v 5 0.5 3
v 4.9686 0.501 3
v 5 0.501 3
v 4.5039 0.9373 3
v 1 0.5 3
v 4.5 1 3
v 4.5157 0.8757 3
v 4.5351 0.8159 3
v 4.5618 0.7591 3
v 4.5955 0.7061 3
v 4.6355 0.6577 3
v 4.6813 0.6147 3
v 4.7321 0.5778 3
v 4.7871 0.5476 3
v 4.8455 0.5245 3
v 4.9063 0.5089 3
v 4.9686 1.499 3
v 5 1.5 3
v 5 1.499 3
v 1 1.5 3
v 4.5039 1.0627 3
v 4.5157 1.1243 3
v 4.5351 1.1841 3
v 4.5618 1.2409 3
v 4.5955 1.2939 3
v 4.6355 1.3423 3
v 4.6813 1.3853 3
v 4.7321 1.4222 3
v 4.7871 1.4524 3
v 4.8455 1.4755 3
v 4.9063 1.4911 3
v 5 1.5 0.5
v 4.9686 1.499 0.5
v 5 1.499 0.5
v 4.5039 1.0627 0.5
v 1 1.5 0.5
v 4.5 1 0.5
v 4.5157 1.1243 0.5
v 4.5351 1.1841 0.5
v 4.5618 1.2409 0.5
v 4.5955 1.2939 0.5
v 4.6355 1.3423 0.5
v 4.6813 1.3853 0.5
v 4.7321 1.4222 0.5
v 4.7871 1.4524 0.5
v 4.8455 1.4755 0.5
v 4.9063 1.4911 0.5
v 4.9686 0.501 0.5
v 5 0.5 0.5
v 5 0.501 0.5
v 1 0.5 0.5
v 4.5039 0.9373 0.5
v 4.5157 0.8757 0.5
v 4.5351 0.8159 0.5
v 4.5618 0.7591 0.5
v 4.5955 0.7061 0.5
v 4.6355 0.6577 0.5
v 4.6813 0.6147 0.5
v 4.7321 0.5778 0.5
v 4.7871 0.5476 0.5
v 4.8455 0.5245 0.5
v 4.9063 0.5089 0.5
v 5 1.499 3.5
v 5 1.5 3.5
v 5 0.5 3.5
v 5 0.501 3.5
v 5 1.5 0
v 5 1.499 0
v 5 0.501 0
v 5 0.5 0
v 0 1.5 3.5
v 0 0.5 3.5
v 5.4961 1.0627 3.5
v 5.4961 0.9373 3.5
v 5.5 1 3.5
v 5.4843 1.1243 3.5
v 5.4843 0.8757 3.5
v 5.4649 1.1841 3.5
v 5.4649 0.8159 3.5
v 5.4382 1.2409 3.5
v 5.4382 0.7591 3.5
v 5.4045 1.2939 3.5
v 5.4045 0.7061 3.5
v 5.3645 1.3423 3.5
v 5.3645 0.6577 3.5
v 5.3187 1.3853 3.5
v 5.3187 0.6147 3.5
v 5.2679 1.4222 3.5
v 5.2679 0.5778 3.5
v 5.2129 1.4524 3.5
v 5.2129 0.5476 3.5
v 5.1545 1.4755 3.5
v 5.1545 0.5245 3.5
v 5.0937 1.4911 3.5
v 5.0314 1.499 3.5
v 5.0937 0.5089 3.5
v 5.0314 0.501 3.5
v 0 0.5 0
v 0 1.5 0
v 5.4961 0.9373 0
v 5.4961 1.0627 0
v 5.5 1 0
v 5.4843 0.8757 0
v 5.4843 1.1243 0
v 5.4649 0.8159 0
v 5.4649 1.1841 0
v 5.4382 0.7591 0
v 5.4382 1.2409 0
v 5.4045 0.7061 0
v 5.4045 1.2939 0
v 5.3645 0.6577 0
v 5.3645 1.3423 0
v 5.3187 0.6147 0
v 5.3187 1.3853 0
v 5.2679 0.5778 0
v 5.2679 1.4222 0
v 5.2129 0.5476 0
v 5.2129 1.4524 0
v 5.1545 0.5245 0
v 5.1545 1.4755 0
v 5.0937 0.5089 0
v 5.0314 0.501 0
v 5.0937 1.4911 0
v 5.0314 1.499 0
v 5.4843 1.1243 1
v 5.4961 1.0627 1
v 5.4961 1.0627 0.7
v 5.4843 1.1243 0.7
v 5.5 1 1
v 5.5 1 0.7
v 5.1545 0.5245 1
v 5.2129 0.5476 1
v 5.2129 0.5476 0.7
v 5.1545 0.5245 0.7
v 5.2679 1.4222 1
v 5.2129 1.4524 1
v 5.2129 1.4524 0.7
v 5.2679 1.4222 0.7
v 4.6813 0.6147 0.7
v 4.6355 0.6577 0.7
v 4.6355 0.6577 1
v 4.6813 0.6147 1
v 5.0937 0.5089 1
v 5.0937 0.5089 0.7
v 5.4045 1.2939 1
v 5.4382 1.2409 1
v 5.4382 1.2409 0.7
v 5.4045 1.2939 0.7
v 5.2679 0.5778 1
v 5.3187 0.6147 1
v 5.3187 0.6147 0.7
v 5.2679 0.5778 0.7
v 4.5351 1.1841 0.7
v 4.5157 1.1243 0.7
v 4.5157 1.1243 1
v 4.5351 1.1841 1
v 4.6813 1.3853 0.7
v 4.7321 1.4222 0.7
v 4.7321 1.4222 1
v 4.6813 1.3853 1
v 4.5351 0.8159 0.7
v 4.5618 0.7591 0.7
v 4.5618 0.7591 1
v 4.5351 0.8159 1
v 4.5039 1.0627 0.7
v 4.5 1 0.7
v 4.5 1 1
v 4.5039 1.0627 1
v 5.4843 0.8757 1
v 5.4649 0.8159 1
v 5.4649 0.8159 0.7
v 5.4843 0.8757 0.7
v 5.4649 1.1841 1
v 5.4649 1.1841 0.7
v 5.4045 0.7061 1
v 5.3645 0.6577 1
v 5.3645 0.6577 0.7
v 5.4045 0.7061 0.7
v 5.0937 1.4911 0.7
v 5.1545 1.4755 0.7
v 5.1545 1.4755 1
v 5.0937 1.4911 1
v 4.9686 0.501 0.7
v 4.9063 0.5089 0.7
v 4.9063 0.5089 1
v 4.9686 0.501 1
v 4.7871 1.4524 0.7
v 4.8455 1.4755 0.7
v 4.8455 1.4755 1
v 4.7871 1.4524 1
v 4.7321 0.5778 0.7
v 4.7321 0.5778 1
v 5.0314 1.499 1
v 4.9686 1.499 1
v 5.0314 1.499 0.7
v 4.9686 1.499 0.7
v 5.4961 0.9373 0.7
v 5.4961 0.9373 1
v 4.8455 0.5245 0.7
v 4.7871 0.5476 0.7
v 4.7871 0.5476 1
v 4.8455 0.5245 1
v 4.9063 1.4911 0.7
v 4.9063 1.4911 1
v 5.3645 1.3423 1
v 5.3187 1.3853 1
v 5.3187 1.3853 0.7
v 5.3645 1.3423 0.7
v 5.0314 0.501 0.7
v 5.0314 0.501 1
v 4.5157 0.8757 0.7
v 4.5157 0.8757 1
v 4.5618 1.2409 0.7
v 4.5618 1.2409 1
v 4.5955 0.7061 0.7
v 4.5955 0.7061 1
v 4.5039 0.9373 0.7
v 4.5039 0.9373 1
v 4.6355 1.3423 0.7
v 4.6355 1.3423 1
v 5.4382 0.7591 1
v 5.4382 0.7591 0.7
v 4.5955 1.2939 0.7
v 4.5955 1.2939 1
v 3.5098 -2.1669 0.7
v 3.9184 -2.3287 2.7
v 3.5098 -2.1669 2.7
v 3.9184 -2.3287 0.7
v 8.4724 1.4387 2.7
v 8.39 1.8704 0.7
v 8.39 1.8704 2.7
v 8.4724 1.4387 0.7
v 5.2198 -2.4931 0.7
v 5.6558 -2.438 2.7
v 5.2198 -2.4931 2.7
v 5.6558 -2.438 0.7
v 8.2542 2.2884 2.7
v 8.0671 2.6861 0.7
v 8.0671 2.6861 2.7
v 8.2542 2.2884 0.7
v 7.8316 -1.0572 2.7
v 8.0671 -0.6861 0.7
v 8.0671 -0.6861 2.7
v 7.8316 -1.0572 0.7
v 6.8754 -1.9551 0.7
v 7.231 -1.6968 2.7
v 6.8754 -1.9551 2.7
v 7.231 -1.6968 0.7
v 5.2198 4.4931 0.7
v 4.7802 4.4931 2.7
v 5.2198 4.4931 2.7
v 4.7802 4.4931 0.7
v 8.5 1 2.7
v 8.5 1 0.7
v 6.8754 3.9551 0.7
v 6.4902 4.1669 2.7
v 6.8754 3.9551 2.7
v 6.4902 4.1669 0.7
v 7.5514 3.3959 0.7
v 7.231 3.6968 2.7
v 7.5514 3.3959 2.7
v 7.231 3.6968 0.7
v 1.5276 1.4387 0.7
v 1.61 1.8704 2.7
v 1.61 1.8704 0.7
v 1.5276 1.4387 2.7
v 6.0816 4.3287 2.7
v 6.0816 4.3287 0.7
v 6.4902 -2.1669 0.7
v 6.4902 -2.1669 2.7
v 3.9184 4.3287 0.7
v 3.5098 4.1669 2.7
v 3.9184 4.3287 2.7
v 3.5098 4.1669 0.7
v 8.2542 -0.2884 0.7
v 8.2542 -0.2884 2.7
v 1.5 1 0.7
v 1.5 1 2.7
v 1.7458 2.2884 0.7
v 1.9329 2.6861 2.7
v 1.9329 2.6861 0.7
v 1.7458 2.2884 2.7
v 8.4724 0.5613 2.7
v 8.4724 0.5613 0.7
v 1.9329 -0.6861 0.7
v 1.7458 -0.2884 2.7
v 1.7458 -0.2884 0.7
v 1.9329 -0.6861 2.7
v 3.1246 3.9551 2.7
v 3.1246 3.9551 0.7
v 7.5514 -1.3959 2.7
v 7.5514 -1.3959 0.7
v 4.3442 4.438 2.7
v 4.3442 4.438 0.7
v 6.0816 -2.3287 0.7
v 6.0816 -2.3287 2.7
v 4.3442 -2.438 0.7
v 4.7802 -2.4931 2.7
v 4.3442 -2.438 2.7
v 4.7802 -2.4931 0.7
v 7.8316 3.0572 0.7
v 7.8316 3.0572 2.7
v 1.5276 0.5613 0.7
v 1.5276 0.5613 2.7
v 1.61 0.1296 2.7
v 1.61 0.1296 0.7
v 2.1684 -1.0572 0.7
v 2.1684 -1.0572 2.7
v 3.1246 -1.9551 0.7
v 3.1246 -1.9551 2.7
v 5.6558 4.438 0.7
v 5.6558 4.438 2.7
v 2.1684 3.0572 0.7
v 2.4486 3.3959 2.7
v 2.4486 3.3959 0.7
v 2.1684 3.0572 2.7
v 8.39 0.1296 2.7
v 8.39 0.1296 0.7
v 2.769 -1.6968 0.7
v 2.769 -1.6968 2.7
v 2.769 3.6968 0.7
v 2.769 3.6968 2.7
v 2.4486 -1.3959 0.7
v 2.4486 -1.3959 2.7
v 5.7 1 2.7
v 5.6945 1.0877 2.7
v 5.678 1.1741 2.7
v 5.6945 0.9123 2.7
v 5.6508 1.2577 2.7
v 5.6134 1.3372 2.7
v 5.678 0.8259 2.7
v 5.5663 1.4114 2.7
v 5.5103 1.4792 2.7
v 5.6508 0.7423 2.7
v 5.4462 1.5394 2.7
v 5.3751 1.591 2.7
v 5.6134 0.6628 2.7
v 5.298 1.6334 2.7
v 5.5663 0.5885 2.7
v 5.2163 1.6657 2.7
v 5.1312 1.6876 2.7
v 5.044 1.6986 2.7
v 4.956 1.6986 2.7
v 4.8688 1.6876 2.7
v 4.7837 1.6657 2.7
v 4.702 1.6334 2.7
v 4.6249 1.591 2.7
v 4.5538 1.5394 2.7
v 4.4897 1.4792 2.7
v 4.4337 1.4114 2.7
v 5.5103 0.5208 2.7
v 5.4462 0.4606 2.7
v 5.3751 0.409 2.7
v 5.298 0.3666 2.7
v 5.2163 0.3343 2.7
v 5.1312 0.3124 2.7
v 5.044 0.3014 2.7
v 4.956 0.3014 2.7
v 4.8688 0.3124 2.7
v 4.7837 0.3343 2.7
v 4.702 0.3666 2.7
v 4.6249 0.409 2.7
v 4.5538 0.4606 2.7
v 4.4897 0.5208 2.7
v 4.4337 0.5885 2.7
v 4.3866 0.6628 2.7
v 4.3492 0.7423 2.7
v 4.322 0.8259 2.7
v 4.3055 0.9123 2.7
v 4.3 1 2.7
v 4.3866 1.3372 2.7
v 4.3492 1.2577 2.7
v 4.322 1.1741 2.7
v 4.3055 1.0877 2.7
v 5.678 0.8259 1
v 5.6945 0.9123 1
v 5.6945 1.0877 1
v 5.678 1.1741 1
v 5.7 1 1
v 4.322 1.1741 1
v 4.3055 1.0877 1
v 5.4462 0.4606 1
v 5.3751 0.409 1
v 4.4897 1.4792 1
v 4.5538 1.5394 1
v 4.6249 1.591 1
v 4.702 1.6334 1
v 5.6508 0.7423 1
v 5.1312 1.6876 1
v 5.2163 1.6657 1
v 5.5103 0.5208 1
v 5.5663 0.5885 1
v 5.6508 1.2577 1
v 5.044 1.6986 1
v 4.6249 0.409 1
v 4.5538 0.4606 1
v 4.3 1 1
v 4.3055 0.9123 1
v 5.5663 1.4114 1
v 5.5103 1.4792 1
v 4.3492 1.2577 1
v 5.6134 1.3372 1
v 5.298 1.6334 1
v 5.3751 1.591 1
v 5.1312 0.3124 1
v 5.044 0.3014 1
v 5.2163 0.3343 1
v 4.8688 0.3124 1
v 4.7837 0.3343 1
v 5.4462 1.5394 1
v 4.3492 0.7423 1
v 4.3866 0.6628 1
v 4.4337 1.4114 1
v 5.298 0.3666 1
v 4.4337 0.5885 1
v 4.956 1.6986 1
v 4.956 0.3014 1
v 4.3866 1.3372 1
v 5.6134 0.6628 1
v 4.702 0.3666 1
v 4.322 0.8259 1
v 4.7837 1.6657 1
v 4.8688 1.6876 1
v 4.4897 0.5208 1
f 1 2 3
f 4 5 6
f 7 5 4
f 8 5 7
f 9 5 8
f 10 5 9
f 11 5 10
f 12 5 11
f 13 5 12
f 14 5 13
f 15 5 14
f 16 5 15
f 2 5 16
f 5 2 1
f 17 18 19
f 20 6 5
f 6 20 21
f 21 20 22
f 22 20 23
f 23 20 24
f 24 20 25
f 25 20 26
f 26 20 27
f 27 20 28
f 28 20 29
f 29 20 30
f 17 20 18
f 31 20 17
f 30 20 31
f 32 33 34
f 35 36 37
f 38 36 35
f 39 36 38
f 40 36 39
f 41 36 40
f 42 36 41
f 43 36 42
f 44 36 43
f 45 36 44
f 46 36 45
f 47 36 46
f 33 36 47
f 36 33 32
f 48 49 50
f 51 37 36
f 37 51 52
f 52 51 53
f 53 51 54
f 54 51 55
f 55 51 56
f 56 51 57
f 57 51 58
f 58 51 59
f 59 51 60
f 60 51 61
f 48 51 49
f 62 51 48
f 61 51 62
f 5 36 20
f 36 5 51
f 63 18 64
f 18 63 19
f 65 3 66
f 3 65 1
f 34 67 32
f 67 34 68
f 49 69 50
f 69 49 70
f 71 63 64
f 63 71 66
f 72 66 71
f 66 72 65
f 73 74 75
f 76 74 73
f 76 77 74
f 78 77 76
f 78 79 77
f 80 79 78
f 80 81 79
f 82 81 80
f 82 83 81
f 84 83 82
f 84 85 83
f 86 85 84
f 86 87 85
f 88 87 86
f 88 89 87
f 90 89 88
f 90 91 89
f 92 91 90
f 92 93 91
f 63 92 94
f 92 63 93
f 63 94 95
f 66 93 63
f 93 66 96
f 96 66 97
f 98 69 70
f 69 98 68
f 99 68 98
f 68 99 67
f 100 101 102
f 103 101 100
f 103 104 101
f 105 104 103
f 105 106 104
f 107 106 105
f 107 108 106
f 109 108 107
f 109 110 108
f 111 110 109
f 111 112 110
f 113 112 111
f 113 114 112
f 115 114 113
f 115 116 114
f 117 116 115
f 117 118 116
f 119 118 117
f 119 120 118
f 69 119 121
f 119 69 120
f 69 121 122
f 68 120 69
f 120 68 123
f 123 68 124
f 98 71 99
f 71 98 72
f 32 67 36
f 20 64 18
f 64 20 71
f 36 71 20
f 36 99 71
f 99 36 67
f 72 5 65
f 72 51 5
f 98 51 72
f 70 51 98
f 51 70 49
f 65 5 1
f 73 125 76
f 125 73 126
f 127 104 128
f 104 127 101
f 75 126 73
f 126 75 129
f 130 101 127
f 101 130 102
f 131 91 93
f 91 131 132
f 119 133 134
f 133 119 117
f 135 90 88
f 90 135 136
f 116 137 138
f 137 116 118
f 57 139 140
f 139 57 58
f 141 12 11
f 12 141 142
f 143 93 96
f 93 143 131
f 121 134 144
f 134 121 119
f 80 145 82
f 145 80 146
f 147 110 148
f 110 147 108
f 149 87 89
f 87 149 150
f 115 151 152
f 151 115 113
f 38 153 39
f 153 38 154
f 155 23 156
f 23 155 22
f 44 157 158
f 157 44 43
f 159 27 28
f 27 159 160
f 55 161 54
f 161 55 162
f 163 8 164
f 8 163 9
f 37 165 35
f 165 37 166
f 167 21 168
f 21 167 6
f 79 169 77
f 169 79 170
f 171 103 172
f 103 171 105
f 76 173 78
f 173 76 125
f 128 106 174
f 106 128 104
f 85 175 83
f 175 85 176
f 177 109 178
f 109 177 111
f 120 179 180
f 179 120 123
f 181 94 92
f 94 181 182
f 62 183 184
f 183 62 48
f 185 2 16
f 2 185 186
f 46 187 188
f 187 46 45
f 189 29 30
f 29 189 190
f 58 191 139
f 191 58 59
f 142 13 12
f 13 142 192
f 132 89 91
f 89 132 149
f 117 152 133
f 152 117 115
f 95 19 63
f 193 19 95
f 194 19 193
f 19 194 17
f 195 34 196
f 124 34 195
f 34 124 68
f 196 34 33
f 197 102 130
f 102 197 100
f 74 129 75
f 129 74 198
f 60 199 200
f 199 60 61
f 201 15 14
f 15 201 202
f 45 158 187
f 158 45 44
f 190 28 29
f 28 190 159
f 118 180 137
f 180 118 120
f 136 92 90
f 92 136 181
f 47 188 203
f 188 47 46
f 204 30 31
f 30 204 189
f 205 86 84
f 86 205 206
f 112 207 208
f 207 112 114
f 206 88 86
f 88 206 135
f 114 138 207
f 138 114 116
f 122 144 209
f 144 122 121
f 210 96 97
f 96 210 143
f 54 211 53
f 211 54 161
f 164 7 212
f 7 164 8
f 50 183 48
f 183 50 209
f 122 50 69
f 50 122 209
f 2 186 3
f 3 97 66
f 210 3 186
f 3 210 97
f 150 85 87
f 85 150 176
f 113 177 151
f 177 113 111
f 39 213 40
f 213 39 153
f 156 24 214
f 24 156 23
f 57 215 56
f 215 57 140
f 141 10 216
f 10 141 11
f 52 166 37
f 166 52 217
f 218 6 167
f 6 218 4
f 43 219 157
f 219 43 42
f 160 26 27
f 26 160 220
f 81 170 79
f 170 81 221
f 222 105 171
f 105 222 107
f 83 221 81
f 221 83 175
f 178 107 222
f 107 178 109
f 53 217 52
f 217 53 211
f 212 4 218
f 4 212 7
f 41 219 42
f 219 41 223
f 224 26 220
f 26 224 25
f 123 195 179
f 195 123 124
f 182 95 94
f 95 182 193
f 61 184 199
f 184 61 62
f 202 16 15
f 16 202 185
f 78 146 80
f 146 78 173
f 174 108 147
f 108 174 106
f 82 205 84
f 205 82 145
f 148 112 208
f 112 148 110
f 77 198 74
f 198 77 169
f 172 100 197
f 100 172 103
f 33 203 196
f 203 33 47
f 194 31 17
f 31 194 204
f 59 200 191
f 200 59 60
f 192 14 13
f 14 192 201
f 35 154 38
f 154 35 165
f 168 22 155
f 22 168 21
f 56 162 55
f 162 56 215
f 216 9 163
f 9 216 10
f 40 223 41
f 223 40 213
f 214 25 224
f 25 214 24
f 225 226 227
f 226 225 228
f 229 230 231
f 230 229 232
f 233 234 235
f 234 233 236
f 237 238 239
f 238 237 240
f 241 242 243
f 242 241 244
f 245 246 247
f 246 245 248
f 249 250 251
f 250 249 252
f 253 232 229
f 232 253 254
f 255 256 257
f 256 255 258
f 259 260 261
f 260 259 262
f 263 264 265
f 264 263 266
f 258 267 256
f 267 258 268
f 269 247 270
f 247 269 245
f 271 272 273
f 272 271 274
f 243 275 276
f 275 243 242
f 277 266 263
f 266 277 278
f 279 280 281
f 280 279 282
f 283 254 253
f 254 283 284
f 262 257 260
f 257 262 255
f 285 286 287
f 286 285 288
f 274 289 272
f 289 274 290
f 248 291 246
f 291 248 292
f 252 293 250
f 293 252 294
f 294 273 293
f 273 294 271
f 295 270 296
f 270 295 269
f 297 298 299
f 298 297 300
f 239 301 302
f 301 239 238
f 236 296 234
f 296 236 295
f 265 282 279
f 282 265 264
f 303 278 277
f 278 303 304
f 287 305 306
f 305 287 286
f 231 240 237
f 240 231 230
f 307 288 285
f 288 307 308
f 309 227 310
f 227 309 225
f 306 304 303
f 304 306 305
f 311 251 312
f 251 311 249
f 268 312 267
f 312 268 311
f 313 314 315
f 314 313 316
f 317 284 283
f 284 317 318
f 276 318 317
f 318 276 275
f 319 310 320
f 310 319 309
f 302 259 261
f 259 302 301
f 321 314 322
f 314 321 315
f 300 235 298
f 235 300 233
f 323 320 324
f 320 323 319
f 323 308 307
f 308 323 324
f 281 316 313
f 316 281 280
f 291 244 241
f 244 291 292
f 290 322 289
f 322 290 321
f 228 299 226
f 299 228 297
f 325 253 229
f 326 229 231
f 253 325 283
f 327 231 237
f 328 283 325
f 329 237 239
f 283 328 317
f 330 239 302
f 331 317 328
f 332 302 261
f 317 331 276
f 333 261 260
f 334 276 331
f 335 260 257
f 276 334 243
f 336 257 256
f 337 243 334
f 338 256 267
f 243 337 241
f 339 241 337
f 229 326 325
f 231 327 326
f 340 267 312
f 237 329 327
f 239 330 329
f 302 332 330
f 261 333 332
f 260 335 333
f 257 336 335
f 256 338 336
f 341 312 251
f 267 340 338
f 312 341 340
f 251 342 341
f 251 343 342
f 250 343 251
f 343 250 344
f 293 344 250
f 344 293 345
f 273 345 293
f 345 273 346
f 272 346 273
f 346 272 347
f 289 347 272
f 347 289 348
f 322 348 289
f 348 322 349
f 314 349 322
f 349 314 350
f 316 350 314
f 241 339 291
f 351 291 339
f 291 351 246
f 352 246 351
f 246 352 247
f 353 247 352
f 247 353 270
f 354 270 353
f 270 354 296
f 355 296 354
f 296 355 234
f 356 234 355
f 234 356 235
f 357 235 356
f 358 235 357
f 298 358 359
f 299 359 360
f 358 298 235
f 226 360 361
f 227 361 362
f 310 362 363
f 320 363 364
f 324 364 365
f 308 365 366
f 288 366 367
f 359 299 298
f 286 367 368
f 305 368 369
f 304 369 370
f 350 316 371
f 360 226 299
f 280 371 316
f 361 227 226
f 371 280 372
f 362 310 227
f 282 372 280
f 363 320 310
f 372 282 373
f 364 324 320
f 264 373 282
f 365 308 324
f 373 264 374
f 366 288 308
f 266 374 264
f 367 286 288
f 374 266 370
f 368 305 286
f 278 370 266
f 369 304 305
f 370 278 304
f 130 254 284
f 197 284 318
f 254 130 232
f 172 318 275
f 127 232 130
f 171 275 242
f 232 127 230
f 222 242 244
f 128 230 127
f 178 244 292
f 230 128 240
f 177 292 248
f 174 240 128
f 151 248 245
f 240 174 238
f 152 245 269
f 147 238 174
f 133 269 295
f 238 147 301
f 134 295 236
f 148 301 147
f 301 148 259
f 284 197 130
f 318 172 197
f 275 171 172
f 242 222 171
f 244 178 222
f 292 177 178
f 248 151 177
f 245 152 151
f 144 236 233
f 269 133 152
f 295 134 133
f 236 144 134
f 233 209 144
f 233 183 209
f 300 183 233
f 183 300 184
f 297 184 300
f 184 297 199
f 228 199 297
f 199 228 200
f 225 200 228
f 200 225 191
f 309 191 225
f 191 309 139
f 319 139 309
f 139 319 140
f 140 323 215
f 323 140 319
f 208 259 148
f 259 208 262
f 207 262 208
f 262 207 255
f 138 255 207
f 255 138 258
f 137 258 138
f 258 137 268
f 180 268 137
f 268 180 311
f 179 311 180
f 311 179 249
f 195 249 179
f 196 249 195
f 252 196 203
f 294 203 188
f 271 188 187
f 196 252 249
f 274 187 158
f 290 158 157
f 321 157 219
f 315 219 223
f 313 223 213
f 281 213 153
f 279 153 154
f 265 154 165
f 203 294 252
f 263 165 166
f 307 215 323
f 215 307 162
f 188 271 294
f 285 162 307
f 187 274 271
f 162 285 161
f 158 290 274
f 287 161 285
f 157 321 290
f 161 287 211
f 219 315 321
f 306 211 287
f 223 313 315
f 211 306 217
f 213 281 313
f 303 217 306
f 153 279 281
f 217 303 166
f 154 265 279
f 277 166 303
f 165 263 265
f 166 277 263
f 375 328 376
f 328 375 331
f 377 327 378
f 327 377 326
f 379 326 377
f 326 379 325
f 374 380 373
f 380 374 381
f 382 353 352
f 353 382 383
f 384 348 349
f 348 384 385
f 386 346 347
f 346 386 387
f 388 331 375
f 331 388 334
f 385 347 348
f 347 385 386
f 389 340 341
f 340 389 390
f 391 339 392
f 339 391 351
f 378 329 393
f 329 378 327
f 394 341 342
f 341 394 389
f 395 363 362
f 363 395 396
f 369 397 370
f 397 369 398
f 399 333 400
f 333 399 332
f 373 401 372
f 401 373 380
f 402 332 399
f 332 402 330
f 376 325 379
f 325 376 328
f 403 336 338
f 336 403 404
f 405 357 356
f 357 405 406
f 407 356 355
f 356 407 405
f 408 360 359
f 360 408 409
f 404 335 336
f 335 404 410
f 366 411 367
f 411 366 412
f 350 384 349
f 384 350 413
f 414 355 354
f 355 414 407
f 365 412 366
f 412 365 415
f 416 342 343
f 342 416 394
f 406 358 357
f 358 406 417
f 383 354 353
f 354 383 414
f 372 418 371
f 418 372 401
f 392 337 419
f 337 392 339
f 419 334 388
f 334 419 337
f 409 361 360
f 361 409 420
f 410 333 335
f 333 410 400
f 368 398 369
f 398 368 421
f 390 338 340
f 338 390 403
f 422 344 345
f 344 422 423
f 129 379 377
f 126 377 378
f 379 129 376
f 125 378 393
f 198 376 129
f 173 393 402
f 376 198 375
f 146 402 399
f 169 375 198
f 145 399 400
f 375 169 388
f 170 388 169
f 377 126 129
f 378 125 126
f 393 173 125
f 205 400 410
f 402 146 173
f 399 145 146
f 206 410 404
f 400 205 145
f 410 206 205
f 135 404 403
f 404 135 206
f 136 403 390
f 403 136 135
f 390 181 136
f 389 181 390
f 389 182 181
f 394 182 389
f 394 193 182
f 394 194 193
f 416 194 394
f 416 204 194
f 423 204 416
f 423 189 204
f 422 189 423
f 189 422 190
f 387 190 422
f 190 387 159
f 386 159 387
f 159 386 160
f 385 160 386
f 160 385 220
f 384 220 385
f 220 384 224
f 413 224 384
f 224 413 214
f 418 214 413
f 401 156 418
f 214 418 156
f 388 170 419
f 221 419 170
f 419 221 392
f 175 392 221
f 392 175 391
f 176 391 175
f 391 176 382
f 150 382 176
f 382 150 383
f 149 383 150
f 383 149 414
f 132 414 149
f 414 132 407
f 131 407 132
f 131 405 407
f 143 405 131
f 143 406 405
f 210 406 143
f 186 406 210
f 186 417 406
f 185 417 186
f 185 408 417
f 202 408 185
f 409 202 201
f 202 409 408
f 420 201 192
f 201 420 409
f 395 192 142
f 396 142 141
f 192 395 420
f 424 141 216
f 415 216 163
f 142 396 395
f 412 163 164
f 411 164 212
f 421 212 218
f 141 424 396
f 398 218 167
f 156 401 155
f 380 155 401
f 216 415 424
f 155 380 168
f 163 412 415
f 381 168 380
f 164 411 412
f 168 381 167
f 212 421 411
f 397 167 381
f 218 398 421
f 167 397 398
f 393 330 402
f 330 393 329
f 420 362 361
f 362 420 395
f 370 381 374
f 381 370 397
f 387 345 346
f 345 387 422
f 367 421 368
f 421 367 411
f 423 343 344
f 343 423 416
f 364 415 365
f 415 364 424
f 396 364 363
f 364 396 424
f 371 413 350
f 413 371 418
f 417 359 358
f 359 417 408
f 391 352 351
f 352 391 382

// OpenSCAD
module inner(){
 	translate([1,0.5,0])
 		cube([6,7,2.5]);
 	cube([8,6.5,2.5]);
 }
 
 module box(){

	translate([0,0.5,0])
 	difference(){
 		cube([5,1,3.5]);
 
 		translate([1,-0.5,0.5])
 			inner();
 	}
 	
 	translate([5,1,0])
 		cylinder(r=0.5, h=3.5, $fn=50);
 }
 
 module roller(){
 	difference(){
 		color("red")
 			translate([5,1,0.7])
 			cylinder(r=3.5, h=2, $fn=50);
 
 		translate([5,1,1])
 			cylinder(r=0.7, h=3, $fn=50);
 	}
 }
 
 module vex(){
 	translate([5, 1, 1.5])
 		for( i = [0:5] ){
 
 			rotate(i*360/6, [0,0,1])
 			translate([0, 3, 0])
 			cylinder(r=0.4, h=0.5, $fn=50);
 	}
 }
 
 box();
 roller();
 //vex();
